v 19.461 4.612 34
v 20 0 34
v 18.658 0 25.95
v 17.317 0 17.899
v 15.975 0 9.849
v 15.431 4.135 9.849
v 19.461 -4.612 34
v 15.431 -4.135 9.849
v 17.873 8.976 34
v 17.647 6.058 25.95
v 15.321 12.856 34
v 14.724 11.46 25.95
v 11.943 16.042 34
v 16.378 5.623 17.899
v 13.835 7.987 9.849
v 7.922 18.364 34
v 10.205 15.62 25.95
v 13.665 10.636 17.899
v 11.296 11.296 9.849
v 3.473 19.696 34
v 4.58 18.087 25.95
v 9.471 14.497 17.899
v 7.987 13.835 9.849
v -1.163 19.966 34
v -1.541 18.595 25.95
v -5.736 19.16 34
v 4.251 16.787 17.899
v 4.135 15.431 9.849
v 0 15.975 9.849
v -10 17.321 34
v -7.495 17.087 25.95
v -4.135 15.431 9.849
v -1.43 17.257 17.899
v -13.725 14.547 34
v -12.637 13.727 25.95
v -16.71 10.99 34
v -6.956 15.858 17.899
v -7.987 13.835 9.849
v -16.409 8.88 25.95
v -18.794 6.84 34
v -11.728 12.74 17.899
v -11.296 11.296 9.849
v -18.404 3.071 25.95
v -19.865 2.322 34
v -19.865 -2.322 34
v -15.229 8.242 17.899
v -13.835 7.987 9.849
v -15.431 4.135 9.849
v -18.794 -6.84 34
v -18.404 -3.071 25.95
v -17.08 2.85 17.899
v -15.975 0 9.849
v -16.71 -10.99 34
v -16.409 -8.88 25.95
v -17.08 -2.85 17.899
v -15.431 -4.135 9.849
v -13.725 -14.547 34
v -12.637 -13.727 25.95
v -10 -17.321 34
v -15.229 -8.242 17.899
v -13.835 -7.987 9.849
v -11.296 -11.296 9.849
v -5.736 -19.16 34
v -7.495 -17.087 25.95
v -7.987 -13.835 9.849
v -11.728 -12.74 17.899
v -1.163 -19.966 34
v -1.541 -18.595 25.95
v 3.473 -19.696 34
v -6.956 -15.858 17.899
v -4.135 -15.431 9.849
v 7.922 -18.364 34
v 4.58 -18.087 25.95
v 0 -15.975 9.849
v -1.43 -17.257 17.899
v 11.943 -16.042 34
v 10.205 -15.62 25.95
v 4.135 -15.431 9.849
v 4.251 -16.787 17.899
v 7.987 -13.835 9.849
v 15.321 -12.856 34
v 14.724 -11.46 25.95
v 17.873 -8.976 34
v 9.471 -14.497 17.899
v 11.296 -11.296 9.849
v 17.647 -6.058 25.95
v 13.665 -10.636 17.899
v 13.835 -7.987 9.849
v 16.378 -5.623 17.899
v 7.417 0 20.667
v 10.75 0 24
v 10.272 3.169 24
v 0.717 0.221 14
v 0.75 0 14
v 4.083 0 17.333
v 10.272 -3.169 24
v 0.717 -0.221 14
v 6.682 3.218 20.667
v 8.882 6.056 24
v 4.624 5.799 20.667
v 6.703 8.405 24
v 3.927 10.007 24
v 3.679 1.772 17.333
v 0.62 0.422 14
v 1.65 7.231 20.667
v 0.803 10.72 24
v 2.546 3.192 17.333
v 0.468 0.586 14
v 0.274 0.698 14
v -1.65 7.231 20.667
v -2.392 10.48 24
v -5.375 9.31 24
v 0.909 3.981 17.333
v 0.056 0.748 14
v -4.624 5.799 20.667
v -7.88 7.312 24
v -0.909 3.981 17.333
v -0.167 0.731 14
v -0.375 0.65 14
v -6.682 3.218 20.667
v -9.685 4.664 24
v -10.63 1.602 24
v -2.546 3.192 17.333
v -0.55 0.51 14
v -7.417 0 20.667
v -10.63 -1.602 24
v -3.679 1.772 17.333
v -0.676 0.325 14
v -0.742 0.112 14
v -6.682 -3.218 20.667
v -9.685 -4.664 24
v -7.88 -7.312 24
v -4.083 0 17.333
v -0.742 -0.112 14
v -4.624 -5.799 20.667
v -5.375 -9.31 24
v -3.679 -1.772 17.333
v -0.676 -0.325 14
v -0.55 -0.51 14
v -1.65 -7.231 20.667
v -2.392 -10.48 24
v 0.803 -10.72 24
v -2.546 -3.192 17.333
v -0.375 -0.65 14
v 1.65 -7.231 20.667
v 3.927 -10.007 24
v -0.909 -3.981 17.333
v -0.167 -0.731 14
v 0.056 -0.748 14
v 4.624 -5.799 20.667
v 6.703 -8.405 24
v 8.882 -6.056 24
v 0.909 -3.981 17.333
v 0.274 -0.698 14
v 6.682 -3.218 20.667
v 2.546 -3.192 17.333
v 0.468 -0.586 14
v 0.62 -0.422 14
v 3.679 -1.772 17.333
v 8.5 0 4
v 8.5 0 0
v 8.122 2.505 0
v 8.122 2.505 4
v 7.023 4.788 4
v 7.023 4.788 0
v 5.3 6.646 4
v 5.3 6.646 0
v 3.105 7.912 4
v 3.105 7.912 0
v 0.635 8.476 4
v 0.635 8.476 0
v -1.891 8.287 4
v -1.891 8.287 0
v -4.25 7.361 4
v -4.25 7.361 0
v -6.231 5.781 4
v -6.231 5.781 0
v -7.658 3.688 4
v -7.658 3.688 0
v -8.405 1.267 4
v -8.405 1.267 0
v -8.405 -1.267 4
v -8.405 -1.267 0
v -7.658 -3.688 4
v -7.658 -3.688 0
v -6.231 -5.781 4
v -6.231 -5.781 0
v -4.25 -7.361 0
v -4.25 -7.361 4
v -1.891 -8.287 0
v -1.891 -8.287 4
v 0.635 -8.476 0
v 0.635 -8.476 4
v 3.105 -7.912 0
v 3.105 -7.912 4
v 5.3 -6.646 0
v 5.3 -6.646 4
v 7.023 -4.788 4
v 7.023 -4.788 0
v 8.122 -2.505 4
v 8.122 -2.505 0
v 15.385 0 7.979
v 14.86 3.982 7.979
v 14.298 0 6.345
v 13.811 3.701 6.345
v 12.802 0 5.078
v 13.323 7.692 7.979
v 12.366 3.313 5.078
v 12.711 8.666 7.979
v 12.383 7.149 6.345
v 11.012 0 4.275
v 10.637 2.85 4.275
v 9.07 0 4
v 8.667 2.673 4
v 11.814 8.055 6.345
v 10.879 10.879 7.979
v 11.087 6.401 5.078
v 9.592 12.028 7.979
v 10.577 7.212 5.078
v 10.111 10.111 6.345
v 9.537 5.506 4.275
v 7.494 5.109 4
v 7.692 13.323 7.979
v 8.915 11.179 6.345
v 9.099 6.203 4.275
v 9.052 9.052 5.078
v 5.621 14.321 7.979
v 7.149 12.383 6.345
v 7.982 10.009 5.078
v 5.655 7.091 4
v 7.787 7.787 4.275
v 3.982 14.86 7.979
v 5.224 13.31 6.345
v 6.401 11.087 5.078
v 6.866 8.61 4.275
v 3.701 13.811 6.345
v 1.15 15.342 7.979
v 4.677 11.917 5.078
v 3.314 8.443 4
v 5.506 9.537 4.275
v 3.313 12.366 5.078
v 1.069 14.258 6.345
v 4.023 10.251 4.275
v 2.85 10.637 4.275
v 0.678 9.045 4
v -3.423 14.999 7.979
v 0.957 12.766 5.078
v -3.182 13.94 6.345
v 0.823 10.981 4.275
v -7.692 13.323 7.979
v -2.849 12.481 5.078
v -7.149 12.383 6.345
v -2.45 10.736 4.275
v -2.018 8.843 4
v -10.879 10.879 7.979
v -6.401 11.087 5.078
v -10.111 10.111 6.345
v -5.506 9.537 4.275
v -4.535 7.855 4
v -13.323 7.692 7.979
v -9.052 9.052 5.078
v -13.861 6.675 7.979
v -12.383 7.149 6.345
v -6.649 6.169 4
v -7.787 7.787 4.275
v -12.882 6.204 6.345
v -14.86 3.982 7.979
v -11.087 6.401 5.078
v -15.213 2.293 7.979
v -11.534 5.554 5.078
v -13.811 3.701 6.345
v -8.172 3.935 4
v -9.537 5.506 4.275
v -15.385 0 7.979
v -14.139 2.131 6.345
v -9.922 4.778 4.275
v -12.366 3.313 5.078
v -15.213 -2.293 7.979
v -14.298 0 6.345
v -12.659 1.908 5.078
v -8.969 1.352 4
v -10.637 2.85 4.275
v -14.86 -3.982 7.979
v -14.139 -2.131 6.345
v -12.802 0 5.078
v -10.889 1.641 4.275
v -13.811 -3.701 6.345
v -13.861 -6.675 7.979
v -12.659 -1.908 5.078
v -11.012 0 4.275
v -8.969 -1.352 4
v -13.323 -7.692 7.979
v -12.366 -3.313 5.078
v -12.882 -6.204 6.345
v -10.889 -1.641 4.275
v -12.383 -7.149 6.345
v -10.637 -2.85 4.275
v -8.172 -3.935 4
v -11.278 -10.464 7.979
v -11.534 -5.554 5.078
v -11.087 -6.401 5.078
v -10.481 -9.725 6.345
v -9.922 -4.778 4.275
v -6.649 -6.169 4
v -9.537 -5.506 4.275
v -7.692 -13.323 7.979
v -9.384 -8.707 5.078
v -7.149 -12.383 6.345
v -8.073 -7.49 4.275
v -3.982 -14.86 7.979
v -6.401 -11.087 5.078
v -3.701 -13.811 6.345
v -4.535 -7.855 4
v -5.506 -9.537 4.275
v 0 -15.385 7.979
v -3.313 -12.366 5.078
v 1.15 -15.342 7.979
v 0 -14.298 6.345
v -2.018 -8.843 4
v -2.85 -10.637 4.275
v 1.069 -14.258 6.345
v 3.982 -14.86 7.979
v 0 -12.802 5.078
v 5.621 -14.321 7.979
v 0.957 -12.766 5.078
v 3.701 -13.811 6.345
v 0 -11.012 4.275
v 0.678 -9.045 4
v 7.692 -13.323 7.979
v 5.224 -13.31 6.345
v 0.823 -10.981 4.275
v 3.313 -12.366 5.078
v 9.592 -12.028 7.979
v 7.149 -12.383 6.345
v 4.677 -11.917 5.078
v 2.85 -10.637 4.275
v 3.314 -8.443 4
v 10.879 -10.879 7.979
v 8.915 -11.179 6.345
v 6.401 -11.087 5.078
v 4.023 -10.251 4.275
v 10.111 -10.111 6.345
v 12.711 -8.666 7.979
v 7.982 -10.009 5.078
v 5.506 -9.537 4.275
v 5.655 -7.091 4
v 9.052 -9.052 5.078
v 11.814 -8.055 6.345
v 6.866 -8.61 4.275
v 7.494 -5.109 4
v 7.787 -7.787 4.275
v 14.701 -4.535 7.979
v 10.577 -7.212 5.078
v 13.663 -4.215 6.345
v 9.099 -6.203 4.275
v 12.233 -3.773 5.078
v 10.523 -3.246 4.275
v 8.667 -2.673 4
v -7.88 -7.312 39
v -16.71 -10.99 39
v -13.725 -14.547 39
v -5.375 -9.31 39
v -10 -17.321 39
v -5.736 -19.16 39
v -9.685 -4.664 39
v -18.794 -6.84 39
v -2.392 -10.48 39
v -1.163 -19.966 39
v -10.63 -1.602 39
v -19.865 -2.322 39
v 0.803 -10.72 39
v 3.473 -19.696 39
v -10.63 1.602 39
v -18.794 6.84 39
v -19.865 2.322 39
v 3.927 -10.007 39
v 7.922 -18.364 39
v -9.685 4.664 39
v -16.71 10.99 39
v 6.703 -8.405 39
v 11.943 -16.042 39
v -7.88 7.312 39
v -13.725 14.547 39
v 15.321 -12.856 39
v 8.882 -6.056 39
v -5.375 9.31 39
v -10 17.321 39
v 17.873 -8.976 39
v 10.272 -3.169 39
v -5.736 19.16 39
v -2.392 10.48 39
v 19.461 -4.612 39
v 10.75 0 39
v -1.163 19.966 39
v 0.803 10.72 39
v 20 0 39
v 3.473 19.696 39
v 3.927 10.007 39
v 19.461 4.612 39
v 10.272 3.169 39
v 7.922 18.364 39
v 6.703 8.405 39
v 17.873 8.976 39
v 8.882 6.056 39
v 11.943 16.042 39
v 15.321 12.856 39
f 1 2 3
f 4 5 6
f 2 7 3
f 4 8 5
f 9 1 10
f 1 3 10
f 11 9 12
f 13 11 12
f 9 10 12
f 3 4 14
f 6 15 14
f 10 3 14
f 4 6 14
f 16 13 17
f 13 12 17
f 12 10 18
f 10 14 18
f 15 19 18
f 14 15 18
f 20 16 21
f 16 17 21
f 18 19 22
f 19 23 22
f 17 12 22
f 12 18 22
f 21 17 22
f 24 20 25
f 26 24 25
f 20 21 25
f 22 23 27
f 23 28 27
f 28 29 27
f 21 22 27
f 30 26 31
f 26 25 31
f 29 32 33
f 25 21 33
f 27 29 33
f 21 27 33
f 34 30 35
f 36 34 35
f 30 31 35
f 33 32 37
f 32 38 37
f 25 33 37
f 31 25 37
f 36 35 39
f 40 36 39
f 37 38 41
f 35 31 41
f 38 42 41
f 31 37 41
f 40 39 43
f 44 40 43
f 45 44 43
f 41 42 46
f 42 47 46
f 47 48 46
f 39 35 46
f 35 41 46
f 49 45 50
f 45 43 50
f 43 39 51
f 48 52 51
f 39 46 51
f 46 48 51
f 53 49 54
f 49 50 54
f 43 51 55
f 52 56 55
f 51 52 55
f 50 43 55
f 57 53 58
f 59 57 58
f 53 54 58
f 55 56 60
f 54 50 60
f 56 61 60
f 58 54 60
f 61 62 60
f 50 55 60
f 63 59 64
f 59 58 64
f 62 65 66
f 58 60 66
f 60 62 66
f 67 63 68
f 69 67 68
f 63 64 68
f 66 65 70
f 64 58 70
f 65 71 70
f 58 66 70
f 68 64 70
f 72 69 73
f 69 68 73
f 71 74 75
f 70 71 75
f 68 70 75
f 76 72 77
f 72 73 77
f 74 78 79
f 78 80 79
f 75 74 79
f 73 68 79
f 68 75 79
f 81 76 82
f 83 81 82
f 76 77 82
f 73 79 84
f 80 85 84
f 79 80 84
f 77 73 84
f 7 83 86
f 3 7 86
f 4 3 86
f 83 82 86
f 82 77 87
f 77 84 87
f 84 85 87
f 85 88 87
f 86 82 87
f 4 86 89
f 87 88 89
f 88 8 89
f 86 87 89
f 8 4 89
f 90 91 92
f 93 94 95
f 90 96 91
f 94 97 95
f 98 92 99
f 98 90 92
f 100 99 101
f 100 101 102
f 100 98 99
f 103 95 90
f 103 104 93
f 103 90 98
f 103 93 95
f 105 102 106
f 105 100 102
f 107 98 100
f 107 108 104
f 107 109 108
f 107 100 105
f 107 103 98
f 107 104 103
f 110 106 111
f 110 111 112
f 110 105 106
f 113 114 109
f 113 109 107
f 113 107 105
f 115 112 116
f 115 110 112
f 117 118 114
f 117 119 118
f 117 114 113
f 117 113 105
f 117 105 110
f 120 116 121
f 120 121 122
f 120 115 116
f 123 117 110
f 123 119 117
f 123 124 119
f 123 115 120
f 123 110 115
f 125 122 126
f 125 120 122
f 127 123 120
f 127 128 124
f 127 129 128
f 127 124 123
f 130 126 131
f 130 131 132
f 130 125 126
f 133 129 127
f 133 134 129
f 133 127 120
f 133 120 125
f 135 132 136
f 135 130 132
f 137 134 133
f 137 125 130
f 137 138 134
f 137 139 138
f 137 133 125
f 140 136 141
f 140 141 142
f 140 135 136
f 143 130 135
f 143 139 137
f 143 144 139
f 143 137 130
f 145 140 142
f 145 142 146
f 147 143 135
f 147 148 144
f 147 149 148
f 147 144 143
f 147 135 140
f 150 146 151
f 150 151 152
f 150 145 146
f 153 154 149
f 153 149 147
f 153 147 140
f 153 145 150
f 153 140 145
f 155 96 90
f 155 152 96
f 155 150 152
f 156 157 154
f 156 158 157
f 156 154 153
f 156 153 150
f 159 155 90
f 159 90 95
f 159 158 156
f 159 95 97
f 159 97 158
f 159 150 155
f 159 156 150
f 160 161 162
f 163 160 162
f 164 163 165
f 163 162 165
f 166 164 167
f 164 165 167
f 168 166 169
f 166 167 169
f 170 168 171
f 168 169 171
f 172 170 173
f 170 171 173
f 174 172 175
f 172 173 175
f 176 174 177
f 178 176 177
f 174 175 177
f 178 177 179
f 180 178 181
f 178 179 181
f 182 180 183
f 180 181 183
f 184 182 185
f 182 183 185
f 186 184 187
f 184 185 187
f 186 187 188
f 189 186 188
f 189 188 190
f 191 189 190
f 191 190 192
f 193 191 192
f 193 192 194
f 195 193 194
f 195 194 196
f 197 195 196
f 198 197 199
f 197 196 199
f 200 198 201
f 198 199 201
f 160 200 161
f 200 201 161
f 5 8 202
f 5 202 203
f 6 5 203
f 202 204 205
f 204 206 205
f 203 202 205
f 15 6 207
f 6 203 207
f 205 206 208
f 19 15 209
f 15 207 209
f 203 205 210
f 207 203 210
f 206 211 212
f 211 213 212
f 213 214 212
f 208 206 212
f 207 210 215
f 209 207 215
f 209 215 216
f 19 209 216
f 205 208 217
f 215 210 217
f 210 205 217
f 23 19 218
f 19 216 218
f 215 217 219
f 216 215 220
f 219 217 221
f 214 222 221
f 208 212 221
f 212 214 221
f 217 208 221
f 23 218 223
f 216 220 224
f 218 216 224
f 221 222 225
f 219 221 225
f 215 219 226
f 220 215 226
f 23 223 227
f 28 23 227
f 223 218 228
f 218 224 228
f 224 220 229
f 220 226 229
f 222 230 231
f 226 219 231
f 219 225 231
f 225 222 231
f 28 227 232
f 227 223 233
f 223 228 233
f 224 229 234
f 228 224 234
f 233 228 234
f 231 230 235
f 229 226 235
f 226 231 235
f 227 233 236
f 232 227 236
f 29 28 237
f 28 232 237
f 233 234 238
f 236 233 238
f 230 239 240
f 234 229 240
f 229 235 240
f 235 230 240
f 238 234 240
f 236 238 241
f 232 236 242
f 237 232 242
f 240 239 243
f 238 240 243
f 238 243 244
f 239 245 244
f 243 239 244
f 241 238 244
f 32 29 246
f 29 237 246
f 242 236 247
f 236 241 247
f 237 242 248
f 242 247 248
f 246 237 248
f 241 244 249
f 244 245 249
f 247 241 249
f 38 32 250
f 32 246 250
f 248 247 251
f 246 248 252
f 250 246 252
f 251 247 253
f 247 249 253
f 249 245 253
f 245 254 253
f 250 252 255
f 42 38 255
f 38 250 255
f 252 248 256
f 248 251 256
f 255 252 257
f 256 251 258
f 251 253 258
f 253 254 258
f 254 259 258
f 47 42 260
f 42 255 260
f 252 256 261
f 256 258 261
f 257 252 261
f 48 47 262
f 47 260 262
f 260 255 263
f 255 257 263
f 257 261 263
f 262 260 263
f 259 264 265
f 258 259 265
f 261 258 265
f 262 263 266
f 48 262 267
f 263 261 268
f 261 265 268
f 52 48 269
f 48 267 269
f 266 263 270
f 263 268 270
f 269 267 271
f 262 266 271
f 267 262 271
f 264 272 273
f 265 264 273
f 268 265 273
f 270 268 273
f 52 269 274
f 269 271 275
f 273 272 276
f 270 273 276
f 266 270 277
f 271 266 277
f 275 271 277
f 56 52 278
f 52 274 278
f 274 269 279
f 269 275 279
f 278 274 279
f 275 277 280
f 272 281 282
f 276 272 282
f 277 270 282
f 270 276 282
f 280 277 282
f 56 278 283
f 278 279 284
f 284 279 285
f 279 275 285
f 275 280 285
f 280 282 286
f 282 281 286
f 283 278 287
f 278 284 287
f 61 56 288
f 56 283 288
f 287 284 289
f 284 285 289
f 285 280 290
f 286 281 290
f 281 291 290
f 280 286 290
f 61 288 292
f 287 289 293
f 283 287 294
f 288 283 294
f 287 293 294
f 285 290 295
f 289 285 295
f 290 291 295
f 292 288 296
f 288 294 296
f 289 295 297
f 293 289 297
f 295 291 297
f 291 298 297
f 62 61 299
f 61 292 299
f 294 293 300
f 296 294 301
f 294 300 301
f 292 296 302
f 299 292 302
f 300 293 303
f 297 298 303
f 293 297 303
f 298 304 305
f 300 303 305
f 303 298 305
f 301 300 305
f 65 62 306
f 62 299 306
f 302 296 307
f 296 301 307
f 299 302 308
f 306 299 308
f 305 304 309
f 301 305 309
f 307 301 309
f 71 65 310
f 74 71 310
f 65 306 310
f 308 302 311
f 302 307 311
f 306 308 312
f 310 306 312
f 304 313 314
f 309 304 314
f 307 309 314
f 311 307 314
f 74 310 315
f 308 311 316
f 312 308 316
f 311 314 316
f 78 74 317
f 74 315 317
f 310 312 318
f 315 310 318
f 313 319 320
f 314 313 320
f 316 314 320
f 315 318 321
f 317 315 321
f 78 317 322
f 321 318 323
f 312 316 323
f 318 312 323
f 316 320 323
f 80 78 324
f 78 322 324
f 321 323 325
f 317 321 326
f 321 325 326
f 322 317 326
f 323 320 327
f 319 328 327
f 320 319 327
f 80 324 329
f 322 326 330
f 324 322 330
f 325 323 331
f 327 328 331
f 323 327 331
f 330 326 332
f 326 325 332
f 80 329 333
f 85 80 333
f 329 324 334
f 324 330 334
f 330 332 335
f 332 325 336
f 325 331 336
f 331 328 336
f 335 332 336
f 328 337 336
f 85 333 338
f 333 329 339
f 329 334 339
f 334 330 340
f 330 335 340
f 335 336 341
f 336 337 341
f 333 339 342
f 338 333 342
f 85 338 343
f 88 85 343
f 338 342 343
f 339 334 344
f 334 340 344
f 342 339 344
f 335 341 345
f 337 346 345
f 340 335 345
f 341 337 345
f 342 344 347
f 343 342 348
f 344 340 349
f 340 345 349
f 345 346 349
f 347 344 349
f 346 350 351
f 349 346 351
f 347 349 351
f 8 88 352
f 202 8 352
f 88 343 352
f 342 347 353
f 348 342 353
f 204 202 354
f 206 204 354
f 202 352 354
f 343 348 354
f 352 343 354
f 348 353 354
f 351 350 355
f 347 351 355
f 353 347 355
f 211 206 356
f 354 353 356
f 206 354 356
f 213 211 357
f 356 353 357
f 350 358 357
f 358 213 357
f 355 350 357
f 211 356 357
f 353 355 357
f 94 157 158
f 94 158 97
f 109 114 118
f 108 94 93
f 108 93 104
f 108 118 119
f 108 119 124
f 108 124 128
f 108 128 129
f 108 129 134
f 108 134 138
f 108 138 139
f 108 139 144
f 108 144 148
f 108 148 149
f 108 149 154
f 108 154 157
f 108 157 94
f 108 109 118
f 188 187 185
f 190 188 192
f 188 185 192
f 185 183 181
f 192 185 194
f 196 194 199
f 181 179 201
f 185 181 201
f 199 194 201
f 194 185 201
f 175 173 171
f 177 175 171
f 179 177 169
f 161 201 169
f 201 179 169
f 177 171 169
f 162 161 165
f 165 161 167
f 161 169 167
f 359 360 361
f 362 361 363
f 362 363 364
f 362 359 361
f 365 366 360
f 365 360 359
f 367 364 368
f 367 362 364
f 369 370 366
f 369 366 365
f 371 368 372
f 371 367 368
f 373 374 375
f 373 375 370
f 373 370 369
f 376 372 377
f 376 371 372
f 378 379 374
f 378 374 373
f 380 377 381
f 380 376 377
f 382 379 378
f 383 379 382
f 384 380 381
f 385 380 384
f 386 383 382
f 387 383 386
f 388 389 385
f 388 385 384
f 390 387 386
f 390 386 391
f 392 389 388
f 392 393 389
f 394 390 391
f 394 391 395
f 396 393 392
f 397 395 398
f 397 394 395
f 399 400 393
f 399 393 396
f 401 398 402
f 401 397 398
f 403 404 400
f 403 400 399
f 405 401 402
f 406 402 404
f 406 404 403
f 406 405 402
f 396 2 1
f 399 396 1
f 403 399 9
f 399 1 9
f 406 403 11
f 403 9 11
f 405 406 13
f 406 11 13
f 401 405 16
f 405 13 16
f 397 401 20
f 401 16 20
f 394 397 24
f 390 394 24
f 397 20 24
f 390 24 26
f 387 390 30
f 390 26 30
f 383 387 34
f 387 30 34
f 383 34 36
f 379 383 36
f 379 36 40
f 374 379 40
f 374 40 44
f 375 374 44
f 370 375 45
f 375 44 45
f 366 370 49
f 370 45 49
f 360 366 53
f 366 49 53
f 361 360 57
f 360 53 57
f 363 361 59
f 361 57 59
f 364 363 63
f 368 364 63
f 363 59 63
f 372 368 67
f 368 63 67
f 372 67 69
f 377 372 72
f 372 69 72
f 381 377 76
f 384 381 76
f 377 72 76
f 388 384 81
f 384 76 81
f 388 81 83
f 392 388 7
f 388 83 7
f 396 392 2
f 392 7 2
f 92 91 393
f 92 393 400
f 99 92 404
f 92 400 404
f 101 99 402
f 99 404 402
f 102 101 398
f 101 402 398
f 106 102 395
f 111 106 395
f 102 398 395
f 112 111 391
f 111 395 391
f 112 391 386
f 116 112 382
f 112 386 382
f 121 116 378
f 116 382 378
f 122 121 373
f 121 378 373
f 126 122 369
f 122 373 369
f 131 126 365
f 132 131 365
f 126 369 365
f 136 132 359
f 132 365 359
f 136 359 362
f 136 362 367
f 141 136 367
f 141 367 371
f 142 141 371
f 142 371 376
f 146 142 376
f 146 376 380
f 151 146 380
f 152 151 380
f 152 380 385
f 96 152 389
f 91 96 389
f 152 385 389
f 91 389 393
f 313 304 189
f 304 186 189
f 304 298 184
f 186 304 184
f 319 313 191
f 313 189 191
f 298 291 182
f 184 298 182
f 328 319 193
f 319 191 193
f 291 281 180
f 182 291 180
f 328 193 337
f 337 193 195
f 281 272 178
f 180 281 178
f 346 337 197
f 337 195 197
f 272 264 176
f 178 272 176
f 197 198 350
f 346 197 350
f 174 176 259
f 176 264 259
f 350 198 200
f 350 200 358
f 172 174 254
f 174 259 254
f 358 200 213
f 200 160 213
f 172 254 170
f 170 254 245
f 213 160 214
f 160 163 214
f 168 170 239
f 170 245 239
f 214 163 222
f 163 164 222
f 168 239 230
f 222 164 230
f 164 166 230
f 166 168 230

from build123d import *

# Parameters (mm, degrees)
F0_R     = 8.5
F1_DEPTH = 4
F2_R     = 20
F3_DEPTH = 35
F4_SIZE2 = 5
F4_SIZE  = 30
F5_R     = 7
F6_R     = 10.75
F7_DEPTH = 25
F8_SIZE  = 10


with BuildPart() as f1:
    # F0 (on Top) → F1 (new body)
    with BuildSketch(Plane.XY):
        Circle(F0_R)
    extrude(amount=F1_DEPTH)

    # F2 (on face) → F3 (join)
    with BuildSketch(Plane.XY.offset(4)):
        Circle(F2_R)
    extrude(amount=F3_DEPTH)

    # F4
    f4_edges = [f1.edges().sort_by_distance(p)[0] for p in [
        (-20, 0, 4),
    ]]
    f4_side = f1.faces().sort_by_distance((-20, 0, 21.5))[0]
    chamfer(f4_edges, length=F4_SIZE, length2=F4_SIZE2, reference=f4_side)

    # F5
    f5_edges = [f1.edges().sort_by_distance(p)[0] for p in [
        (-15, 0, 4),
    ]]
    fillet(f5_edges, radius=F5_R)

    # F6 (on face) → F7 (cut)
    with BuildSketch(Plane.XY.offset(39)):
        Circle(F6_R)
    extrude(amount=-F7_DEPTH, mode=Mode.SUBTRACT)

    # F8
    f8_edges = [f1.edges().sort_by_distance(p)[0] for p in [
        (-10.75, 0, 14),
    ]]
    chamfer(f8_edges, length=F8_SIZE)


solid = f1.part
